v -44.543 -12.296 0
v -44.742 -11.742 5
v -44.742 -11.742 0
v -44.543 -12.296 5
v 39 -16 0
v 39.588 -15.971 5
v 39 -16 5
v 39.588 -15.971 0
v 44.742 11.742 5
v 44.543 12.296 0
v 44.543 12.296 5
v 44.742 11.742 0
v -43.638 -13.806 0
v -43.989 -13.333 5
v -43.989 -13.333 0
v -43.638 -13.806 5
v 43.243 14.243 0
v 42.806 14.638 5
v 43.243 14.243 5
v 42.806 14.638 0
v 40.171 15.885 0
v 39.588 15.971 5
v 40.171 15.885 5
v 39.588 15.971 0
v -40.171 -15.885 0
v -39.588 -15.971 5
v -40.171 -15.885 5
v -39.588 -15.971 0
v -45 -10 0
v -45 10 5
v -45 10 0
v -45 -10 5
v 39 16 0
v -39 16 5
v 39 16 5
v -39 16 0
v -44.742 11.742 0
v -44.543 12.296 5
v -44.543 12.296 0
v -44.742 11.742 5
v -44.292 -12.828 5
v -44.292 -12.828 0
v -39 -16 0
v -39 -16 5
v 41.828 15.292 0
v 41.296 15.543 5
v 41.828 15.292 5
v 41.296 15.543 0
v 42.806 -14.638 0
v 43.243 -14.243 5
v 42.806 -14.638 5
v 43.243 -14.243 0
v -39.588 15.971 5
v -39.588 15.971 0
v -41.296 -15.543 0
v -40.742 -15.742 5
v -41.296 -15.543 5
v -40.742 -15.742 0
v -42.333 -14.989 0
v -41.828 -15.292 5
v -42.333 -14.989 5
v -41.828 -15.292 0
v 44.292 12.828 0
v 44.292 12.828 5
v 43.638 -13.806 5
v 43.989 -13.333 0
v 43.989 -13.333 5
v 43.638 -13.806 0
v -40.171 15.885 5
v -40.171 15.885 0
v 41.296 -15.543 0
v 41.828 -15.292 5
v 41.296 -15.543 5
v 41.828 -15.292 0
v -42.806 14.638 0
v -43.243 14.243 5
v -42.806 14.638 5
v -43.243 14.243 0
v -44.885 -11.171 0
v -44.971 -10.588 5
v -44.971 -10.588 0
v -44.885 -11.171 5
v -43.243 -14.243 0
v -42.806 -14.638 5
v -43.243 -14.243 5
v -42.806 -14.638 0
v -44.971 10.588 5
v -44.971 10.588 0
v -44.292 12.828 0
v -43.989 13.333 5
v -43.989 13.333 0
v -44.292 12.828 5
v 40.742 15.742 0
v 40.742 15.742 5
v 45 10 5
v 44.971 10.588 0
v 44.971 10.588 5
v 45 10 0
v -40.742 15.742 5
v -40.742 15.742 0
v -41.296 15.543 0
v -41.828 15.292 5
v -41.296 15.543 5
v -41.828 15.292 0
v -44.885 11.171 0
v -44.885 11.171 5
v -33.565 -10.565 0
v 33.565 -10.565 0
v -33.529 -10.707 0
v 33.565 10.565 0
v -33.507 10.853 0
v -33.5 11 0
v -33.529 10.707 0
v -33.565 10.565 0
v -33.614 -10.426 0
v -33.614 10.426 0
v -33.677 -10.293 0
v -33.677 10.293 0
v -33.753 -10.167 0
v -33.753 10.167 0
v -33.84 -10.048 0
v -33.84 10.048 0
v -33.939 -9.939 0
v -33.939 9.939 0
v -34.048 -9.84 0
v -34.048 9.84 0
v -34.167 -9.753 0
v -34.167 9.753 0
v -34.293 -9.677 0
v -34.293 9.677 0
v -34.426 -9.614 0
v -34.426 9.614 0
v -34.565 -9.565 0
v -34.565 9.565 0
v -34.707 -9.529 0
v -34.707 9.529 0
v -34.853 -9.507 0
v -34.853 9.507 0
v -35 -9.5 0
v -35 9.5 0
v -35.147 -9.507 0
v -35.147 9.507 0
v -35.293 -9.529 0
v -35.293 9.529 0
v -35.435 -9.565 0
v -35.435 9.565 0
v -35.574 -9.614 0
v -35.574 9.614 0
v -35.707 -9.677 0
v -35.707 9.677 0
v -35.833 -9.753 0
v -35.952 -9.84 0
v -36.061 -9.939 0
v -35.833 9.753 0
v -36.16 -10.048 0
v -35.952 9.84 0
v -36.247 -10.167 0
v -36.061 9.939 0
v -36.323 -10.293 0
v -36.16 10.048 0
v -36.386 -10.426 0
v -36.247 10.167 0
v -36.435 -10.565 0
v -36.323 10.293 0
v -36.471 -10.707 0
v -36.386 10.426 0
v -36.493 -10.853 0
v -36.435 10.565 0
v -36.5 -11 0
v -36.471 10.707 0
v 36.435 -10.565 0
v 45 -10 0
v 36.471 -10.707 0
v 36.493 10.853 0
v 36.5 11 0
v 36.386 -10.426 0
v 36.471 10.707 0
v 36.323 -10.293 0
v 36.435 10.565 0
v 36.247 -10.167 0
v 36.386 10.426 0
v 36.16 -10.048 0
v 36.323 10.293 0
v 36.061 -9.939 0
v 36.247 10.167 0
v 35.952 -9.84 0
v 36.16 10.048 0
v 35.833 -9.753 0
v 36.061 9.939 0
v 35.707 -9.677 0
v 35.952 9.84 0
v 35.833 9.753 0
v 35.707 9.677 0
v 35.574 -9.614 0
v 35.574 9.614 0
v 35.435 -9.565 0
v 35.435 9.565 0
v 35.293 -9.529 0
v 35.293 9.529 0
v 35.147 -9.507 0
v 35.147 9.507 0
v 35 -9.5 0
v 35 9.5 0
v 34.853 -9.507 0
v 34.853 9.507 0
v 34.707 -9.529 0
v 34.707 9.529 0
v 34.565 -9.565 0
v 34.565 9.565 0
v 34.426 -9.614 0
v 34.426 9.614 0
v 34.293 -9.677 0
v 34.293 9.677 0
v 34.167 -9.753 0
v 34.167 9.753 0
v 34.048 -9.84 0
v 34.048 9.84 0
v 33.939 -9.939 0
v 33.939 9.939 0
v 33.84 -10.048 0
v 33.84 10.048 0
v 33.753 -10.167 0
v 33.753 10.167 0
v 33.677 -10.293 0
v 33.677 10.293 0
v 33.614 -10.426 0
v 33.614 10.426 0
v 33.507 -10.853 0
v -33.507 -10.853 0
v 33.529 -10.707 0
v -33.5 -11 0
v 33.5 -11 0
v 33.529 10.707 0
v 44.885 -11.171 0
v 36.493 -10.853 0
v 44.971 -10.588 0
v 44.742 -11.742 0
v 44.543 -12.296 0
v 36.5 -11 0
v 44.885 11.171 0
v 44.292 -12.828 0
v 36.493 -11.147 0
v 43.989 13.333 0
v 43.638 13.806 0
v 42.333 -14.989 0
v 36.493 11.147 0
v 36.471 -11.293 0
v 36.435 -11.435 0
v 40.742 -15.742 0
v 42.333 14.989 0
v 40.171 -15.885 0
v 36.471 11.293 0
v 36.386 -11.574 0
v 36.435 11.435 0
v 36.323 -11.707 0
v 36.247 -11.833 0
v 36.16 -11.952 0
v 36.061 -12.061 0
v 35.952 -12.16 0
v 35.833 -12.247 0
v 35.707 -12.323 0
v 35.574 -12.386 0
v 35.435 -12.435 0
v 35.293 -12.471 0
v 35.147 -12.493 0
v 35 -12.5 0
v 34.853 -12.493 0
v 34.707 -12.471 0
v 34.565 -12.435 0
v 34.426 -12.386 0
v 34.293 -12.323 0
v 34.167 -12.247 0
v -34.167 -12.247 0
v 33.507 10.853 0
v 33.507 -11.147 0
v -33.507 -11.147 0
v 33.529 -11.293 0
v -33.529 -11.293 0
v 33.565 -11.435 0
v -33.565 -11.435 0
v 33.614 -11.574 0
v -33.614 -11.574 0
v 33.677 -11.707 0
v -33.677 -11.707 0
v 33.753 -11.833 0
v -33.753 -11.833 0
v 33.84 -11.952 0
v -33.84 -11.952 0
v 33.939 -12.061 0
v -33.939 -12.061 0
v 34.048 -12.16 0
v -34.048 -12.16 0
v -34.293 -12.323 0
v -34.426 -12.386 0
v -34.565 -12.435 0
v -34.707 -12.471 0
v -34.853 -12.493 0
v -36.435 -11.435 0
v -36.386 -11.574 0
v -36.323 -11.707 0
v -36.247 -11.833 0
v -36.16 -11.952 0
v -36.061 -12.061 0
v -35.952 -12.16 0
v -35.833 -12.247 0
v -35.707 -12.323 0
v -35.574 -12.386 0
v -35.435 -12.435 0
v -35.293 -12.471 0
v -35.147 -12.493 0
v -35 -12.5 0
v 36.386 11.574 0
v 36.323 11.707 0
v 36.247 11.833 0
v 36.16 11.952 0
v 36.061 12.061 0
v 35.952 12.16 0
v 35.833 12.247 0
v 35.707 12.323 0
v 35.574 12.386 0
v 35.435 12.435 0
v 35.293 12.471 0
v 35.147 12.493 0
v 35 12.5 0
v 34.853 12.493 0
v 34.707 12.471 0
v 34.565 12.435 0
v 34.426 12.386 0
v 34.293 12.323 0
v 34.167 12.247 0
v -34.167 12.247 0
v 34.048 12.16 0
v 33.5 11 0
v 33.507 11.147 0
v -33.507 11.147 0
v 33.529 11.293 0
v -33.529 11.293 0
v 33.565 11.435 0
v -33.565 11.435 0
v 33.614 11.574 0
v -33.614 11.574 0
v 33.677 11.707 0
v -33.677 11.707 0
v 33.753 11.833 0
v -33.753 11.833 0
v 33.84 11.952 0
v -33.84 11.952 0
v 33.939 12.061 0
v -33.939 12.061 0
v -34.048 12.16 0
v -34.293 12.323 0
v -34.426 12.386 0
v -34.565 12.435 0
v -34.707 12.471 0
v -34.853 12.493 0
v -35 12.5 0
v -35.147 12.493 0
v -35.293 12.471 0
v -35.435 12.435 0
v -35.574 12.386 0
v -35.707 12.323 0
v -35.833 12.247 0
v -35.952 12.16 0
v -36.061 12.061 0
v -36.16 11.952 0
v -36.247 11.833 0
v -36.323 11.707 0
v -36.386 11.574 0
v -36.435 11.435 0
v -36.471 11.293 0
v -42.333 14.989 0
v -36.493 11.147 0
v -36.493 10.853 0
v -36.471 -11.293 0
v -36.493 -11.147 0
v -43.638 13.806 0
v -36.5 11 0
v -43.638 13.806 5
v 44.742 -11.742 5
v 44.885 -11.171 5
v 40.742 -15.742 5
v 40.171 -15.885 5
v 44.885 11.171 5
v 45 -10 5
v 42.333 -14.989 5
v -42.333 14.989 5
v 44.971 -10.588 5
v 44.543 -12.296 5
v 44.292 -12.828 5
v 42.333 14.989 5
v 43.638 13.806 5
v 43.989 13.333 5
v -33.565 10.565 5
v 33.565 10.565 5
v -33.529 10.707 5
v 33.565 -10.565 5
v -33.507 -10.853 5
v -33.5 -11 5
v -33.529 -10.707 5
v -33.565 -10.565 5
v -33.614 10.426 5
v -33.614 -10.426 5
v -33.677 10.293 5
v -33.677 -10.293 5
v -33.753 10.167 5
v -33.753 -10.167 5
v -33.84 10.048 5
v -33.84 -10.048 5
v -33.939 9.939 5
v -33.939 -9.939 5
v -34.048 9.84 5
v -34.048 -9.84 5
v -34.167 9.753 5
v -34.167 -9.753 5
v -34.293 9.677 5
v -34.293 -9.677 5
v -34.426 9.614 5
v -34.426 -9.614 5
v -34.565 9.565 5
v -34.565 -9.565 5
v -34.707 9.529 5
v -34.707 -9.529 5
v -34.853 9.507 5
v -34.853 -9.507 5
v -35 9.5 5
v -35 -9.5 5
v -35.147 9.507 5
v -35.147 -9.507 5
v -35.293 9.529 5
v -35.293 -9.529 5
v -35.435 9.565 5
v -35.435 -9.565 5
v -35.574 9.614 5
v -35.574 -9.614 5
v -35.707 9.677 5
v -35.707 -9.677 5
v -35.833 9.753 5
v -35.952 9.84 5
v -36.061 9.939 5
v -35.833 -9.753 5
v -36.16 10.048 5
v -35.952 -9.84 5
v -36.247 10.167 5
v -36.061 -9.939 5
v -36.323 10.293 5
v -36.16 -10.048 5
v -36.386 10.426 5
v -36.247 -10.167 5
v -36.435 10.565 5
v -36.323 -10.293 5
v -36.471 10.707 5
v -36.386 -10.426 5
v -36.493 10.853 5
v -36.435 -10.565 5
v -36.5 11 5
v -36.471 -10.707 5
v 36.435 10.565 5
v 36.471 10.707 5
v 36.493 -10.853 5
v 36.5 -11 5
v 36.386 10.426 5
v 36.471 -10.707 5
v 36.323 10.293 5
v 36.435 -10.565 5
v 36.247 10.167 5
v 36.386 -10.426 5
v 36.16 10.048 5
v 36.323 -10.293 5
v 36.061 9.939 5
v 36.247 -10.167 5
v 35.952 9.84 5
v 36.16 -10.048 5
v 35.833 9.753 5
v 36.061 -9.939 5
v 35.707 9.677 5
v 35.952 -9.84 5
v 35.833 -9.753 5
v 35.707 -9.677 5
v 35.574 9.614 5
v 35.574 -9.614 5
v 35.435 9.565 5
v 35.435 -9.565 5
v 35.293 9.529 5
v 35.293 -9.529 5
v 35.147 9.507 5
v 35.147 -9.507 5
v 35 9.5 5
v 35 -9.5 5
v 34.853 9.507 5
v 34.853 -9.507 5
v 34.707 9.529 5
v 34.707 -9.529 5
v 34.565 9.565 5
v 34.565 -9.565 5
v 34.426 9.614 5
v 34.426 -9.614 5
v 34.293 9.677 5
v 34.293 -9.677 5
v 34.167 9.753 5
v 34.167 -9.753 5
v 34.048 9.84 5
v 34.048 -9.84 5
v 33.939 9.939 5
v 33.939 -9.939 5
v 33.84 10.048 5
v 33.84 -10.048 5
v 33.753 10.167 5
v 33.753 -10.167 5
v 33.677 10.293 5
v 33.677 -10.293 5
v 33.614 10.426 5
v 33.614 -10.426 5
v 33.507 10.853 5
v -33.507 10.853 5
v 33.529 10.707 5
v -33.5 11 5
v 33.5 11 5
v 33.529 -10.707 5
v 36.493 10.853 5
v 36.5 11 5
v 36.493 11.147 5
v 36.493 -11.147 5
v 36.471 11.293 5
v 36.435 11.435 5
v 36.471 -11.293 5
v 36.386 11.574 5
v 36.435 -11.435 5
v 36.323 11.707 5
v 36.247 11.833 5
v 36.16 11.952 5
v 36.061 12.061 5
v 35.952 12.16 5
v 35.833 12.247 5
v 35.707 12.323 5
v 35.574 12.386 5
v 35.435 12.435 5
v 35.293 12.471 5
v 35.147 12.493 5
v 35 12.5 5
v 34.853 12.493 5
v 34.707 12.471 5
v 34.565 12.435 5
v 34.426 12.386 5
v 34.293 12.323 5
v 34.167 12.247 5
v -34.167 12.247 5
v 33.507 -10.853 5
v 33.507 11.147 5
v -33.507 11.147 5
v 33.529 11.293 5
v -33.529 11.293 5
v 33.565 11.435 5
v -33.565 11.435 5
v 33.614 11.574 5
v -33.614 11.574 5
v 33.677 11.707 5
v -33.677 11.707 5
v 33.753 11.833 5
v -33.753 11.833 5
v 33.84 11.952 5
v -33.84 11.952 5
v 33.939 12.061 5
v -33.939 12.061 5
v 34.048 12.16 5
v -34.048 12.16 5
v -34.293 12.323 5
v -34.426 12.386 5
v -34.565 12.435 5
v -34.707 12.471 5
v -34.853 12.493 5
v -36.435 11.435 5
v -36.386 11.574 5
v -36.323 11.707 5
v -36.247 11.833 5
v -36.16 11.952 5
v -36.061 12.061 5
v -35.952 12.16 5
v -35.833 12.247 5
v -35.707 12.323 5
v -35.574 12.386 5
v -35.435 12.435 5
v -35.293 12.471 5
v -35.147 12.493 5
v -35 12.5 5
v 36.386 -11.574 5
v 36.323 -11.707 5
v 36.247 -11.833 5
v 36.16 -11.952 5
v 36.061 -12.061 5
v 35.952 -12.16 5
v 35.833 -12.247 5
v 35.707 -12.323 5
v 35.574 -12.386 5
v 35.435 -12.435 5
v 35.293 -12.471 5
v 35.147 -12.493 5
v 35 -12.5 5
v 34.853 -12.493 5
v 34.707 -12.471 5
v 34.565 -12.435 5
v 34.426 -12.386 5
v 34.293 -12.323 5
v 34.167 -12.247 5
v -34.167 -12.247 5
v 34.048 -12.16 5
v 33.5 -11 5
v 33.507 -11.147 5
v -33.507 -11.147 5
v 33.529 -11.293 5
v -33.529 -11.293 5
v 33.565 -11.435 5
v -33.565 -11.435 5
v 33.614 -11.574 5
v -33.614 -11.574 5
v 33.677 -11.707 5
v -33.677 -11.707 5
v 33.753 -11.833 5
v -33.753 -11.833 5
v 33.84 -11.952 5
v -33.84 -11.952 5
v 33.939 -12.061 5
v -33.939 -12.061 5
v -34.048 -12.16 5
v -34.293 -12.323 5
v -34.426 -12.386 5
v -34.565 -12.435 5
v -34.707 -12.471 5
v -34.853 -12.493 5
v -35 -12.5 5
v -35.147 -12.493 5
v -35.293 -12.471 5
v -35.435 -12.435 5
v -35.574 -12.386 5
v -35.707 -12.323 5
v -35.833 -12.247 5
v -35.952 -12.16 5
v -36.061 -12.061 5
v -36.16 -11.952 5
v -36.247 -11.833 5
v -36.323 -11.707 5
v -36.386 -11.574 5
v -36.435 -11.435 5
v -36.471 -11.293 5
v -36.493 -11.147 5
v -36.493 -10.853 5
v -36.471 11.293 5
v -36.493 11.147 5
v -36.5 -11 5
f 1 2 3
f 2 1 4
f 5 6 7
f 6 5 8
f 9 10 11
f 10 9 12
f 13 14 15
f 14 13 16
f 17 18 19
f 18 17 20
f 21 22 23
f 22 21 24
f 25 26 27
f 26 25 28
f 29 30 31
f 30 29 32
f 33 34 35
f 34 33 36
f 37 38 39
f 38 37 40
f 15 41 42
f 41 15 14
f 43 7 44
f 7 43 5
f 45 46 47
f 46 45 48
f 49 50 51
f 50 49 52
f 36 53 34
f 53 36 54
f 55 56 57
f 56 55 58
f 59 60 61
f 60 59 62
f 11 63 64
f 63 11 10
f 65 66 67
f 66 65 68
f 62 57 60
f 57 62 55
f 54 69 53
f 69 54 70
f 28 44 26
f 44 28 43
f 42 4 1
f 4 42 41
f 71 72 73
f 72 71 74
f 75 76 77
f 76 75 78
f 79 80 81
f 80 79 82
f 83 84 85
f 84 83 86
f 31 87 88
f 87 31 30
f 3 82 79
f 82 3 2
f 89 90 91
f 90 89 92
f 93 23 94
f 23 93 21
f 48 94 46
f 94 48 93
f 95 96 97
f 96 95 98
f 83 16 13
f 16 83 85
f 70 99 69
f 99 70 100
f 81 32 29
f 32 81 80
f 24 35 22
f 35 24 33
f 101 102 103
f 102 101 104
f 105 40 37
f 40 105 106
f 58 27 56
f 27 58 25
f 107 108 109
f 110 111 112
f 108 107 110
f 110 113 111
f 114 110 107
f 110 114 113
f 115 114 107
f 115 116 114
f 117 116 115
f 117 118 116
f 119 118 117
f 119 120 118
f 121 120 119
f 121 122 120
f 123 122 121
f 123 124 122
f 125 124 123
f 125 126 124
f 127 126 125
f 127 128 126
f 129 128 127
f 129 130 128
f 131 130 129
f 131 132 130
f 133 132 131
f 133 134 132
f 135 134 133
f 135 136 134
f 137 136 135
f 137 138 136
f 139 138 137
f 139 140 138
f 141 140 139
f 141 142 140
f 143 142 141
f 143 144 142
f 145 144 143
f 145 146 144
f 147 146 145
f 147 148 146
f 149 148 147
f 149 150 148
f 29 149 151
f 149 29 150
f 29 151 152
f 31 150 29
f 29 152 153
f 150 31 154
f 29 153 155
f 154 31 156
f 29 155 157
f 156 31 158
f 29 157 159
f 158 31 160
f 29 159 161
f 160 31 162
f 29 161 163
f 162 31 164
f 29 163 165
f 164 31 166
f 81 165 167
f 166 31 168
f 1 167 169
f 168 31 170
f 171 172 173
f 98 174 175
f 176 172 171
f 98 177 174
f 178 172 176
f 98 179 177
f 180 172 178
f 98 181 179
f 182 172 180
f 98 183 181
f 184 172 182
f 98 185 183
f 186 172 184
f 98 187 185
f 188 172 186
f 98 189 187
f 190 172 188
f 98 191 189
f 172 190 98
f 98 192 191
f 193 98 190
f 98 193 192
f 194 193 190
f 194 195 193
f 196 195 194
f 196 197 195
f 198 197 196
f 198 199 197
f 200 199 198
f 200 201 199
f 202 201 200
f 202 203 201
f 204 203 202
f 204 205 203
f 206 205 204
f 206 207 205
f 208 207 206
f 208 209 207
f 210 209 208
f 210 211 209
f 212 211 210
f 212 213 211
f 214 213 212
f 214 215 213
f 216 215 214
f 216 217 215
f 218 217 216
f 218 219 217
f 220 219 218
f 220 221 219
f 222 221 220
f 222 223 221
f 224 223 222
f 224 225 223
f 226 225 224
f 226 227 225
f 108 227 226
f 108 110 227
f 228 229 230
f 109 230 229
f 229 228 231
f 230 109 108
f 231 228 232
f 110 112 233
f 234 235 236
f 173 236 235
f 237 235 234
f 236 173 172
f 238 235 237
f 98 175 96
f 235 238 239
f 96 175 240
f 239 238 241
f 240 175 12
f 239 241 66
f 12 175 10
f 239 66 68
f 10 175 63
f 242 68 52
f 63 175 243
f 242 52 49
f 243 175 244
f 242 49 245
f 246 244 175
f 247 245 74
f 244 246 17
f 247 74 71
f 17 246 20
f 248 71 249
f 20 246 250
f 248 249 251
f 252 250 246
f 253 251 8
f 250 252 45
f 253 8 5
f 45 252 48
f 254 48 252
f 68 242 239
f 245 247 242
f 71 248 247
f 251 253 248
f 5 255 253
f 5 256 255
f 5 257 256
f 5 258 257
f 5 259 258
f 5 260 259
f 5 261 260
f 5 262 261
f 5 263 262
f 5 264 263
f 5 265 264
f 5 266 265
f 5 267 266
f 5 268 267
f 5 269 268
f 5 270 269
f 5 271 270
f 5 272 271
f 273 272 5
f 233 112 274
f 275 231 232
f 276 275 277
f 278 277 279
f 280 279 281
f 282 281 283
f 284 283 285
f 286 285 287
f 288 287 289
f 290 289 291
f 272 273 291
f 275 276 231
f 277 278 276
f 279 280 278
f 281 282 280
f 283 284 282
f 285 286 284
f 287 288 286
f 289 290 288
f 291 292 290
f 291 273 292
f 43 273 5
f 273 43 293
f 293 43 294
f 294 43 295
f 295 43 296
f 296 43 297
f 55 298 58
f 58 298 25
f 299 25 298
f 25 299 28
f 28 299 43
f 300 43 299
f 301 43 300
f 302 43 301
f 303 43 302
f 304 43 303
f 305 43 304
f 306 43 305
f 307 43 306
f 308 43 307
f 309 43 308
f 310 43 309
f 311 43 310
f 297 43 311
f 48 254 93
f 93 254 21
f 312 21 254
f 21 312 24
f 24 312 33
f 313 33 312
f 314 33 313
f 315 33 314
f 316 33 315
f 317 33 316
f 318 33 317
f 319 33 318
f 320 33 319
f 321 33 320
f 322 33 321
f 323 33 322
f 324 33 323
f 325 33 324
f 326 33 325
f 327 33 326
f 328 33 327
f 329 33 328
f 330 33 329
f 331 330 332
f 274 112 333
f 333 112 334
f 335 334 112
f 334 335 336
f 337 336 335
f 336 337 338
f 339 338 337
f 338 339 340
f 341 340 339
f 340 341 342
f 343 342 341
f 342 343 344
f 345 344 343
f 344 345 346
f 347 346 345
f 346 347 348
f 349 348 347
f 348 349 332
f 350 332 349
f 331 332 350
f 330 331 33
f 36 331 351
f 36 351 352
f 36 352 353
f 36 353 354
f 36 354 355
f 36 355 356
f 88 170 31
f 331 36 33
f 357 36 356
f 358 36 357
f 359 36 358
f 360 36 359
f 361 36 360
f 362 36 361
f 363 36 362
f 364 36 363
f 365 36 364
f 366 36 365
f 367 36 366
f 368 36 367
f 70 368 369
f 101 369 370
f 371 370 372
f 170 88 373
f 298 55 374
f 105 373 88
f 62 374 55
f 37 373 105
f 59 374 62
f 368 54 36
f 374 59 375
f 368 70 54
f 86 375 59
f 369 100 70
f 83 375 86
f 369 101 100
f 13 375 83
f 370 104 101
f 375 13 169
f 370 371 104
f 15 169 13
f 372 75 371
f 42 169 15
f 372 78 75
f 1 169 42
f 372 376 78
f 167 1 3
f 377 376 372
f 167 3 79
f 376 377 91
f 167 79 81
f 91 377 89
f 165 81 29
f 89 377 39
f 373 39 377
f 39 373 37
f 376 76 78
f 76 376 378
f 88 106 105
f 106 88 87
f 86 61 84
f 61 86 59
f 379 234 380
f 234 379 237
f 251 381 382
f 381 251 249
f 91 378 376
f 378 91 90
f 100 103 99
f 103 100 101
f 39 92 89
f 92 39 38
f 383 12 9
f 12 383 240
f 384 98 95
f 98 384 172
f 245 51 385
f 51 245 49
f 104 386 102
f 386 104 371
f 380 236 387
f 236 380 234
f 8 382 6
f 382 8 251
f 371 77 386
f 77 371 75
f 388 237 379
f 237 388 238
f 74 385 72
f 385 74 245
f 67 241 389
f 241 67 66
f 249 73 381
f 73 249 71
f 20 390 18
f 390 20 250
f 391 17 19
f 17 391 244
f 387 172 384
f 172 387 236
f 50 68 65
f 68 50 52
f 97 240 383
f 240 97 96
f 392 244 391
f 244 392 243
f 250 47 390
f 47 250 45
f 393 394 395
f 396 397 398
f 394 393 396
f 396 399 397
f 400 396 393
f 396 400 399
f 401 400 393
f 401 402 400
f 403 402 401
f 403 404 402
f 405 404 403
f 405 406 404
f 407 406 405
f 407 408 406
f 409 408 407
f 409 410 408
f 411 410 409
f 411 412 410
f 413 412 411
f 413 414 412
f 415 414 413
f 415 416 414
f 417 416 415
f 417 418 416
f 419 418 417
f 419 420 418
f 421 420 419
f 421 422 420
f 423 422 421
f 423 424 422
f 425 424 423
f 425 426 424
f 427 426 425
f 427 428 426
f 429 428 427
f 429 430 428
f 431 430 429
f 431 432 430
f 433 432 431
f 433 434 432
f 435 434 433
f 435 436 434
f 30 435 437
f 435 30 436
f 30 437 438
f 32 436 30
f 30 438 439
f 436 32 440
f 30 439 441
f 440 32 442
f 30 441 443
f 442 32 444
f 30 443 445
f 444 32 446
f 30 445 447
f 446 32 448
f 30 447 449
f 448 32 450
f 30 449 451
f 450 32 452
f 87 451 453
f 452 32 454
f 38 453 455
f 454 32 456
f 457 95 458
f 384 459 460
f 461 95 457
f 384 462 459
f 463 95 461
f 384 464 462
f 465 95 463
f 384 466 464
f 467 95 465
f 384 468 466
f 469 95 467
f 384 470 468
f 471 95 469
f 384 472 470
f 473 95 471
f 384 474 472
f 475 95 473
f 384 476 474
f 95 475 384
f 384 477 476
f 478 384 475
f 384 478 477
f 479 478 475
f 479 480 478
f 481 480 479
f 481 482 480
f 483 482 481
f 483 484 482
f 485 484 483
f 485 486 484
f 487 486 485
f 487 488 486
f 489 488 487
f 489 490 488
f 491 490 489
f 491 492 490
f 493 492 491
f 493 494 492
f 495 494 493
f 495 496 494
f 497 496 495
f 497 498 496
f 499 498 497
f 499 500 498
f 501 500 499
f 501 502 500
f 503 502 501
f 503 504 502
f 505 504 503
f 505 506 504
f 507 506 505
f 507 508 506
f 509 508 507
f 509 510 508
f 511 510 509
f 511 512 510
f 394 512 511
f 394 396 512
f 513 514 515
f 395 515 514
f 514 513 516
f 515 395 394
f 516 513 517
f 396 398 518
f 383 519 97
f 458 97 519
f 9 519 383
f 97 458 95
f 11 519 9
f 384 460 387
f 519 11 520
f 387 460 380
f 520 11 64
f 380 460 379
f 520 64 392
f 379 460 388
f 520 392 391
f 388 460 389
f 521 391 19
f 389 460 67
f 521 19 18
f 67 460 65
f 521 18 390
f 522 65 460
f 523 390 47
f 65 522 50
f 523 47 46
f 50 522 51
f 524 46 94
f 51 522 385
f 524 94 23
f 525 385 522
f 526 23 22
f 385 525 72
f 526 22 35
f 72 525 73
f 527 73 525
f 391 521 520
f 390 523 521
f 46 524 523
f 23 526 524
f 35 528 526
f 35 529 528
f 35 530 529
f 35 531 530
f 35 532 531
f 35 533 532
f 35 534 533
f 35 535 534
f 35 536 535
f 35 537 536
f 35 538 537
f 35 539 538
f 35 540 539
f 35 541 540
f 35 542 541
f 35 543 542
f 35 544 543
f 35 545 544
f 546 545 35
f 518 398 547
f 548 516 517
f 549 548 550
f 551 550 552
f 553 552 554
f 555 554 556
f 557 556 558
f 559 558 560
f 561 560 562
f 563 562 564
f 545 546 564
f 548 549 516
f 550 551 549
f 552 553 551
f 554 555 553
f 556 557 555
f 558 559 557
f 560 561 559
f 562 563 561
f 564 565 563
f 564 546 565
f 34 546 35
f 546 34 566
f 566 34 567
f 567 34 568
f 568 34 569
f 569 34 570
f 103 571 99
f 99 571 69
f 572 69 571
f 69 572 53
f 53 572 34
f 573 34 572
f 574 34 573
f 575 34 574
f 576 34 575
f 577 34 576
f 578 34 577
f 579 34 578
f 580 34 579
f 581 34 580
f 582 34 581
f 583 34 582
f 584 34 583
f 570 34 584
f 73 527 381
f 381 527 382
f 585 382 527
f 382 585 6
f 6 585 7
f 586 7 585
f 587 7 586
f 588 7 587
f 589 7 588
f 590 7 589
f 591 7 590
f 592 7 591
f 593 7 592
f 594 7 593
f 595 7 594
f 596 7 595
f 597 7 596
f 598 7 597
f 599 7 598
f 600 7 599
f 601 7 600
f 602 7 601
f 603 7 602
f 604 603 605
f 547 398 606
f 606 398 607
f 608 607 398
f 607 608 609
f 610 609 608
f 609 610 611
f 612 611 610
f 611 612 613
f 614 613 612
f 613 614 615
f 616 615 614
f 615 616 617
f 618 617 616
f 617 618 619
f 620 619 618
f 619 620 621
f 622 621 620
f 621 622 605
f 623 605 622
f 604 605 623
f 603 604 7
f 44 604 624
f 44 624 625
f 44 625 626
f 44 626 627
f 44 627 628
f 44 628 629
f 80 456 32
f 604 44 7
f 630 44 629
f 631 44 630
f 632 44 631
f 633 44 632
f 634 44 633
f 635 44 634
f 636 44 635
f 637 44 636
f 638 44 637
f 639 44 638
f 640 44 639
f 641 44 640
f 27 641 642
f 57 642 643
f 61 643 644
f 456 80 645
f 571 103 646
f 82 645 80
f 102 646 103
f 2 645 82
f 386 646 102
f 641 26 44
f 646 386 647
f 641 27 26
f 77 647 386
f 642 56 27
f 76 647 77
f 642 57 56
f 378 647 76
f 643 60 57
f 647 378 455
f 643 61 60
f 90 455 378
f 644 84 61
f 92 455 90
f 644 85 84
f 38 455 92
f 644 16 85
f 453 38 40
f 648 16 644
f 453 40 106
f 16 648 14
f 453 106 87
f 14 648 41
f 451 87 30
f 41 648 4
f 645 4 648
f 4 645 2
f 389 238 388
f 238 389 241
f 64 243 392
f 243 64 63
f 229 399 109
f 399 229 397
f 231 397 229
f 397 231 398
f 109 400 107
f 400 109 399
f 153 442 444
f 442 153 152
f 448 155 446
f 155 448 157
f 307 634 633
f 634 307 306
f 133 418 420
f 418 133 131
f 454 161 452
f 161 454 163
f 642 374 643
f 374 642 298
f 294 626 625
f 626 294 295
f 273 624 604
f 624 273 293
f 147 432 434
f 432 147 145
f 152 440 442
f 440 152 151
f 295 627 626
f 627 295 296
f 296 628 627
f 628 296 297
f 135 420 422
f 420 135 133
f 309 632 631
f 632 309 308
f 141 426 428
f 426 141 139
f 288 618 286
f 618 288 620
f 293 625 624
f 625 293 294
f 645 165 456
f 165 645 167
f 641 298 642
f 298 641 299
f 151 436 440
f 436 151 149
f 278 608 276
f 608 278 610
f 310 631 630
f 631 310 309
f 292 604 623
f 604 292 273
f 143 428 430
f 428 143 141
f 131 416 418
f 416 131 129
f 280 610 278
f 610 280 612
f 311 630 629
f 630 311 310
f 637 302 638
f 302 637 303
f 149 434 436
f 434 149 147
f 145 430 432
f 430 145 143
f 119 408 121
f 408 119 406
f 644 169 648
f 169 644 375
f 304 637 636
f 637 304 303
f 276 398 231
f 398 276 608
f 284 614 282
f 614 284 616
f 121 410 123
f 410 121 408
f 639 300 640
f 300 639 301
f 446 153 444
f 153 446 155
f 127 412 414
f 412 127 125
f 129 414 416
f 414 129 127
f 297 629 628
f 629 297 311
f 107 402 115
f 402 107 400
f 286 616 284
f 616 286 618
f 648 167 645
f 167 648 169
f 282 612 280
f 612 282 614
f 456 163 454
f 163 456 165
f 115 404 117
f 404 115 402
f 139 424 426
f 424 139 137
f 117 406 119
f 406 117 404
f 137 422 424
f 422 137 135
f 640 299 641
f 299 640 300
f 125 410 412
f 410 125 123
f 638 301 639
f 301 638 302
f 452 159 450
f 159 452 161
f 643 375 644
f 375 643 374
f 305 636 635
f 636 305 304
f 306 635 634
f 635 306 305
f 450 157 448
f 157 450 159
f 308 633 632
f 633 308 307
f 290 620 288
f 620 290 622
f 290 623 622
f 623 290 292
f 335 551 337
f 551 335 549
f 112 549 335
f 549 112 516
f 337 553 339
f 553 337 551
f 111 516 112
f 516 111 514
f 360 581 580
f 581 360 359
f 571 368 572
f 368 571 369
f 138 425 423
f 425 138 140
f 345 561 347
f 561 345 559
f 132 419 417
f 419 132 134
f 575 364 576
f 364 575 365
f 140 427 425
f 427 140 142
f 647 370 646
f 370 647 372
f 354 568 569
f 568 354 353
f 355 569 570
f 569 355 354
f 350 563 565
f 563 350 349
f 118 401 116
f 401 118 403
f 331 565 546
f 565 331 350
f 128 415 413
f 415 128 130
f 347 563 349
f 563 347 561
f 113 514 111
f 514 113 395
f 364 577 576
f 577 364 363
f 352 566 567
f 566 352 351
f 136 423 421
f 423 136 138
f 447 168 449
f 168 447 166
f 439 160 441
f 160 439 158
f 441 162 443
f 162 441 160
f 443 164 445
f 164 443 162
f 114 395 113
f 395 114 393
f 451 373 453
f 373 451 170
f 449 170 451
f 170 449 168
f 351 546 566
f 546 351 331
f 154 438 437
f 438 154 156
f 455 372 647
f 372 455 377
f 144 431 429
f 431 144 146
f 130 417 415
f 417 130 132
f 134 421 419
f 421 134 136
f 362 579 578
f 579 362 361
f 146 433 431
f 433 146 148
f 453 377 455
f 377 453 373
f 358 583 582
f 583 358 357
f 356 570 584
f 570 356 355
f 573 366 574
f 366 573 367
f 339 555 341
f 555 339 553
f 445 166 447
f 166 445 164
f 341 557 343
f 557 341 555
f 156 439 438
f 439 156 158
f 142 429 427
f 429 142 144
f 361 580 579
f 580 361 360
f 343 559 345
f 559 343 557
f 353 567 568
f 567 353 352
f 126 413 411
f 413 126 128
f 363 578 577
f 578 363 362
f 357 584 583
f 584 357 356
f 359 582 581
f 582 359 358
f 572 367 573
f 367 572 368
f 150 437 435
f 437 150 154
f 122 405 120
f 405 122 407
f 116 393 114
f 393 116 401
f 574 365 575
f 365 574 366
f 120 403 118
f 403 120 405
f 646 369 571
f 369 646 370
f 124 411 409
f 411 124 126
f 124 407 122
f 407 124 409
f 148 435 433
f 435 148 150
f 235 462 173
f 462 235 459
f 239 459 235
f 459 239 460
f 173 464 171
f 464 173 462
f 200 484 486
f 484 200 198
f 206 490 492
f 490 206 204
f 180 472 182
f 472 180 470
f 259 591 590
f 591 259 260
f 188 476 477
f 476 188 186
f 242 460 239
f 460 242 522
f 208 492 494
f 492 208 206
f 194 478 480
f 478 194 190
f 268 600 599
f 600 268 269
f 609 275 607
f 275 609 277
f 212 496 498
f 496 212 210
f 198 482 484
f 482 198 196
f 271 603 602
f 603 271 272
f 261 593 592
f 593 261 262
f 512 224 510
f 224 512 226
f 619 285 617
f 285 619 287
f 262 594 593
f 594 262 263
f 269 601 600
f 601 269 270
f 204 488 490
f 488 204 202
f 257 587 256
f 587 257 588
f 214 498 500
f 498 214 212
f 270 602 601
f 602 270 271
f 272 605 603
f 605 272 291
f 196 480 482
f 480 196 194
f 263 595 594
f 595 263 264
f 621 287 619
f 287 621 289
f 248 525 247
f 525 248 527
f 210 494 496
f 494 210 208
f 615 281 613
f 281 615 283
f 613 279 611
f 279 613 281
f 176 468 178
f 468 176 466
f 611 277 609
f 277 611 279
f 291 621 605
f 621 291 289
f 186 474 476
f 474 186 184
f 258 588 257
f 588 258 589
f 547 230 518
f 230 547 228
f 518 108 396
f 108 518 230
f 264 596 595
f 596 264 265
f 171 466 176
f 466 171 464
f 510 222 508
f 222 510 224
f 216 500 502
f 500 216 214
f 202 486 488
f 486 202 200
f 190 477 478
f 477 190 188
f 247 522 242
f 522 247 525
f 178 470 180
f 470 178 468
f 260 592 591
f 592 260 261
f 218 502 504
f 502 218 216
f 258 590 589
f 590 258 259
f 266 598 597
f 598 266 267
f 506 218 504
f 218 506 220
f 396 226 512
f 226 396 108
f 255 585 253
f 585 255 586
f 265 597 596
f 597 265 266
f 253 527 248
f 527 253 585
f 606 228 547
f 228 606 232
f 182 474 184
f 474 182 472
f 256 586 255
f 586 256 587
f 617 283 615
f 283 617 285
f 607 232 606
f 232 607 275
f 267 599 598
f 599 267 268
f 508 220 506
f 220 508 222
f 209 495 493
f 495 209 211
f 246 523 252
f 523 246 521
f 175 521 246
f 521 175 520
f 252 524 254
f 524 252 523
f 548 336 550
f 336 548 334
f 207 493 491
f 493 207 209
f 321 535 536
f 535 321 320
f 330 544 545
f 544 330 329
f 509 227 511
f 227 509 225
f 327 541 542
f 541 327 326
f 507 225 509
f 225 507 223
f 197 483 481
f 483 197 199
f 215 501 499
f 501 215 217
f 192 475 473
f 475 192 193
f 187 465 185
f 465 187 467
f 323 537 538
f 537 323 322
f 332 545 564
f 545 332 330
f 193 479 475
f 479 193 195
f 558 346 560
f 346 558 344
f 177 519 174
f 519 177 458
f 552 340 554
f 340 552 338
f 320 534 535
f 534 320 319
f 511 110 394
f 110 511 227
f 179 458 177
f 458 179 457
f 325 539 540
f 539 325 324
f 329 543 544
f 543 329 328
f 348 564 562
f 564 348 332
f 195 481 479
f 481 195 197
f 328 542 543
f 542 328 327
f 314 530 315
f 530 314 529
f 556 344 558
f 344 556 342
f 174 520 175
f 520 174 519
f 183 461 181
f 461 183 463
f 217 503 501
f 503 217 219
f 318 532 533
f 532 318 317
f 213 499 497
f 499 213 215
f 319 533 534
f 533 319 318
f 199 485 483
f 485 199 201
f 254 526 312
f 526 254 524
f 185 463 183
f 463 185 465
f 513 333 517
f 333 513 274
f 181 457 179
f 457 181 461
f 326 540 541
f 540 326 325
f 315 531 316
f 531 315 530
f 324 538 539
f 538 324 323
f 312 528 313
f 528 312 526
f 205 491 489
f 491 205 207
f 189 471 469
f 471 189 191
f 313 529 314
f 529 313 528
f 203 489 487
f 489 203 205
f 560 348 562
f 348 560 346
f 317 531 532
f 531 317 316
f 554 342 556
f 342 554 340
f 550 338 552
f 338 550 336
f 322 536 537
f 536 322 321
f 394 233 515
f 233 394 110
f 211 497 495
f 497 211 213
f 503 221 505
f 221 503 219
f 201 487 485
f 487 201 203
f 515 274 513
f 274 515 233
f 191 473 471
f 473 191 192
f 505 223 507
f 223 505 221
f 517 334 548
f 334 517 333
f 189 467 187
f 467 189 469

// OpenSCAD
// Generated with SolidPython2 for OpenSCAD task-010
$fn = 64;

difference() {
	linear_extrude(height = 5) {
		offset(r = 6) {
			square(center = true, size = [78, 20]);
		}
	}
	translate(v = [-35, -11, -1]) {
		cylinder(h = 7, r = 1.5);
	}
	translate(v = [-35, 11, -1]) {
		cylinder(h = 7, r = 1.5);
	}
	translate(v = [35, -11, -1]) {
		cylinder(h = 7, r = 1.5);
	}
	translate(v = [35, 11, -1]) {
		cylinder(h = 7, r = 1.5);
	}
}
